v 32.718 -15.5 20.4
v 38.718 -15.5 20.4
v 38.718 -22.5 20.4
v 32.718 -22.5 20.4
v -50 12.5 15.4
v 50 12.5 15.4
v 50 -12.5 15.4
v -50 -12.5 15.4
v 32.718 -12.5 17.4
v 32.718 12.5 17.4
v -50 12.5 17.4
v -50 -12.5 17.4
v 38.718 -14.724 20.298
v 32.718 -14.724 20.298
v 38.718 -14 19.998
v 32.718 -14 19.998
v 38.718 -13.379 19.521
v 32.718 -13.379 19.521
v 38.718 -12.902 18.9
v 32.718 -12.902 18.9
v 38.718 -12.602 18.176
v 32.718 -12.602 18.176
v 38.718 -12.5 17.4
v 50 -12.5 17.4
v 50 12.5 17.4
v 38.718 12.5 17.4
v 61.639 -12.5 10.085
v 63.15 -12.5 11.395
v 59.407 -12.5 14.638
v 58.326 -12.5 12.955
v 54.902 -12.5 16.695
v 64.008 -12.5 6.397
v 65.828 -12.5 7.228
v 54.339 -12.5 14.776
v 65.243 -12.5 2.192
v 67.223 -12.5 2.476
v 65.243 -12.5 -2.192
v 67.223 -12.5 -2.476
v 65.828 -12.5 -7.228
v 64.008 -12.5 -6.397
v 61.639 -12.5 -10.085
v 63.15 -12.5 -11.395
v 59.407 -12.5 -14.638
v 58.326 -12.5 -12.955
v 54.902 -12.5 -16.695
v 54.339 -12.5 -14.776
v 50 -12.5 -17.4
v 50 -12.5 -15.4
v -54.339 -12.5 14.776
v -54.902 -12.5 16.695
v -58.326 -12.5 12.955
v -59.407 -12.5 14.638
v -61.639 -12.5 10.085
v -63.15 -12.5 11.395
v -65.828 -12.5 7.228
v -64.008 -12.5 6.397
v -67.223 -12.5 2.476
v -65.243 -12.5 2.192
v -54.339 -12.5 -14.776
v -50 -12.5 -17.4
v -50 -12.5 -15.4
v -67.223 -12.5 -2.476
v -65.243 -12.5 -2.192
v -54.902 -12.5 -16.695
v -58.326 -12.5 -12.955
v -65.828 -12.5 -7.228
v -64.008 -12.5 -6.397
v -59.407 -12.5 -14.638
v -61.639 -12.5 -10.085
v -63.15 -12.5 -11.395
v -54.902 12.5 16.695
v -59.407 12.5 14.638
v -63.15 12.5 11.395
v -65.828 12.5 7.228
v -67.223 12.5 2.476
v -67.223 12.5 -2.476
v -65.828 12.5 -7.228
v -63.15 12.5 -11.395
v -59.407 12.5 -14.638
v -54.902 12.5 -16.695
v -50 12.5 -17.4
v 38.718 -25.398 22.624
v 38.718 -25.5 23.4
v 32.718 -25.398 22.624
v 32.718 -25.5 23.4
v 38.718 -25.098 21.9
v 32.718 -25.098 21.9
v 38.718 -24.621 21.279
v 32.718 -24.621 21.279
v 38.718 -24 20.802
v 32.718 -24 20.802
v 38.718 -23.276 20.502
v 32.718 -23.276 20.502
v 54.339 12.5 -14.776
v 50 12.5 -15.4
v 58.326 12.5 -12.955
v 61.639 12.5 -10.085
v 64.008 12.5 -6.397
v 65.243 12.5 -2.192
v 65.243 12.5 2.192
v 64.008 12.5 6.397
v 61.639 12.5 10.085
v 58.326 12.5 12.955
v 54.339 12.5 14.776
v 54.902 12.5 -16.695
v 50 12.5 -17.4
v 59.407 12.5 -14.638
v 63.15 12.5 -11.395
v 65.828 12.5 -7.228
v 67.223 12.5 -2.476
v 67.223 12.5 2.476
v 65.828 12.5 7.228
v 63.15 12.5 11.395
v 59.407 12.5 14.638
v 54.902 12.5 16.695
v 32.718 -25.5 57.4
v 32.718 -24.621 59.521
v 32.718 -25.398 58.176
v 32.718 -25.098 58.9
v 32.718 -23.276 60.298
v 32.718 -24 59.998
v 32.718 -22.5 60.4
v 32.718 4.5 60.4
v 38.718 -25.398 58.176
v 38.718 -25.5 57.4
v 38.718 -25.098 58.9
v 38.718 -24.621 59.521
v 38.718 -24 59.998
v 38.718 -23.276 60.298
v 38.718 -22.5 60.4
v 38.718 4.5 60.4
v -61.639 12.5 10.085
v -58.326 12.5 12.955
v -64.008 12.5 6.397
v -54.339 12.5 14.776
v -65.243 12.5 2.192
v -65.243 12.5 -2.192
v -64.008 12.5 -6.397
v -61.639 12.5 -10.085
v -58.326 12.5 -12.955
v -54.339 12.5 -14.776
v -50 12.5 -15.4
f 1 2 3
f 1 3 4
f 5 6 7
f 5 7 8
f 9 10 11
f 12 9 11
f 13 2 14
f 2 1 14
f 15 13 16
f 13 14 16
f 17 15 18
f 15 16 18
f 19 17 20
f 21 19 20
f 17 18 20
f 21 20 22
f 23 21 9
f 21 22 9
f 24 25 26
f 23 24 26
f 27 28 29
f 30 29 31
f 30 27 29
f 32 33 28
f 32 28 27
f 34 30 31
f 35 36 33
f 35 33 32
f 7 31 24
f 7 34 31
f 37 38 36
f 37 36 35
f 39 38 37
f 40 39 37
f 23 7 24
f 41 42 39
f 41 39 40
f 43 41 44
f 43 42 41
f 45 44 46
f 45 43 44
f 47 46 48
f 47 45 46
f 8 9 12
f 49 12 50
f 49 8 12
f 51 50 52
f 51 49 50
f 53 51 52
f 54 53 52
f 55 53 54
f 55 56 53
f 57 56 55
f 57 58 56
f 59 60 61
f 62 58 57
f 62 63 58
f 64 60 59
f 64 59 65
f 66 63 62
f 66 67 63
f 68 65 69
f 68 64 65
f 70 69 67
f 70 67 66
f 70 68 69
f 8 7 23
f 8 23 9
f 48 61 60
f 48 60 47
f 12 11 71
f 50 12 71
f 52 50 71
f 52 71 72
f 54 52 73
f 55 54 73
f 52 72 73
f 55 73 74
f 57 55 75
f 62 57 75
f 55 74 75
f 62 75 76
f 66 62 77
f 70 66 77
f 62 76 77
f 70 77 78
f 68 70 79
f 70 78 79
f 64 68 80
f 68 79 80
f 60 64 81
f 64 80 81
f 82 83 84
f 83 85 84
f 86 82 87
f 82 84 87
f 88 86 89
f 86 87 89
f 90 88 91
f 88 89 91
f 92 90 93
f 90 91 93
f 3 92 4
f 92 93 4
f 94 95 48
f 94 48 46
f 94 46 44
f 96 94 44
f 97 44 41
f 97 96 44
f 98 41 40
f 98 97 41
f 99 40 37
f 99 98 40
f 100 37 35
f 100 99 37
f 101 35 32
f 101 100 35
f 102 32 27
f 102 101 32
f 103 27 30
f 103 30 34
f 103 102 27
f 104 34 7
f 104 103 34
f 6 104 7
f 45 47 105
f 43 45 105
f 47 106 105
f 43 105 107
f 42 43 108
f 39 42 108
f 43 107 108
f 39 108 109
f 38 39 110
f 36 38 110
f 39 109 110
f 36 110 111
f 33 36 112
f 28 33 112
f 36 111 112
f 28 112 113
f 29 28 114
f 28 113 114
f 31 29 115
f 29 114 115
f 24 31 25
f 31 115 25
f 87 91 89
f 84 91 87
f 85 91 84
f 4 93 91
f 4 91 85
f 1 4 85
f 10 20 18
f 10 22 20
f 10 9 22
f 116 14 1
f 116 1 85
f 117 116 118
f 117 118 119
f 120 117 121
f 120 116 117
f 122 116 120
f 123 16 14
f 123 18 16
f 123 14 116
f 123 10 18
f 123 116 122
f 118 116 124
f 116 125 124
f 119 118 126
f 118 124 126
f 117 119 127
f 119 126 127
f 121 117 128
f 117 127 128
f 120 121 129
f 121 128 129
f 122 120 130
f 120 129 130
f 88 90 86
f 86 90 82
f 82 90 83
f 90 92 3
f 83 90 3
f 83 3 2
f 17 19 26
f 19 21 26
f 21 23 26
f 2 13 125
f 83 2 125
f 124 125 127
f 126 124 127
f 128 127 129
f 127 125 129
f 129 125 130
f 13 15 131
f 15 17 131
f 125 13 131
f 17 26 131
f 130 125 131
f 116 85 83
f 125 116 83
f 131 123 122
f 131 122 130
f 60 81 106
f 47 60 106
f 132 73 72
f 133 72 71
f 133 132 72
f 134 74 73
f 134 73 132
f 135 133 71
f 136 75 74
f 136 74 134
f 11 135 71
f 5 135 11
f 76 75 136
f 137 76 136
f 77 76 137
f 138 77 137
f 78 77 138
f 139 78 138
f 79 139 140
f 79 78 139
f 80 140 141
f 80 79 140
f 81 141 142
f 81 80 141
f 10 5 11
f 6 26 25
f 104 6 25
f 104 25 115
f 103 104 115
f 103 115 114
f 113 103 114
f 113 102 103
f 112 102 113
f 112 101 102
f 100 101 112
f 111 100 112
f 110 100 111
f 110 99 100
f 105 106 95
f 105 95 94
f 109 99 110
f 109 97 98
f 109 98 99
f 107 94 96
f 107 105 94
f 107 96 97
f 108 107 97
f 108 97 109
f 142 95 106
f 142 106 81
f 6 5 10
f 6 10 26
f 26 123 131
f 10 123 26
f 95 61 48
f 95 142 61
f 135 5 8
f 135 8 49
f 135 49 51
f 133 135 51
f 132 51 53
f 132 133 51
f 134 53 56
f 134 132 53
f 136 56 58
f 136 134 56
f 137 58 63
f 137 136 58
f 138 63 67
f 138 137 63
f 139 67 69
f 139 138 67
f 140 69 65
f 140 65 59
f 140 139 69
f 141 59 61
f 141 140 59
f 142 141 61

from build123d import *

# Parameters (mm, degrees)
EXTRUDE_1_DEPTH     = 12.5
SKETCH_4_W          = 6
SKETCH_4_H          = 43
EXTRUDE_3_DEPTH     = 38
SKETCH_5_W          = 6
SKETCH_5_H          = 13
CUT_EXTRUDE_2_DEPTH = 3
SKETCH_6_W          = 6
SKETCH_6_H          = 43
CUT_EXTRUDE_3_DEPTH = 8
EXTRUDE_5_DEPTH     = 6
FILLET_1_R          = 3
FILLET_2_R          = 3


with BuildPart() as part:
    # 草图1 → 凸台-拉伸1 (new, symmetric)
    with BuildSketch(Plane(origin=(0, 0, 0), x_dir=(1, 0, 0), z_dir=(0, 1, 0))):
        with BuildLine():
            Line((-50, 17.4), (50, 17.4))
            ThreePointArc((50, 17.4), (67.4, 0), (50, -17.4))
            Line((50, -17.4), (-50, -17.4))
            ThreePointArc((-50, -17.4), (-67.4, 0), (-50, 17.4))
        make_face()
        with BuildLine():
            Line((-50, 15.4), (50, 15.4))
            ThreePointArc((50, 15.4), (65.4, 0), (50, -15.4))
            Line((50, -15.4), (-50, -15.4))
            ThreePointArc((-50, -15.4), (-65.4, 0), (-50, 15.4))
        make_face(mode=Mode.SUBTRACT)
    extrude(amount=EXTRUDE_1_DEPTH, both=True)

    # 草图4 → 凸台-拉伸3 (add)
    with BuildSketch(Plane(origin=(0, 12.5, 0), x_dir=(1, 0, 0), z_dir=(0, 1, 0))):
        with Locations((35.717845516, -38.9)):
            Rectangle(SKETCH_4_W, SKETCH_4_H)
    extrude(amount=-EXTRUDE_3_DEPTH)

    # 草图5 → 切除-拉伸2 (cut)
    with BuildSketch(Plane(origin=(0, 0, 17.4), x_dir=(-1, 0, 0), z_dir=(0, 0, -1))):
        with Locations((-35.717845516, -19)):
            Rectangle(SKETCH_5_W, SKETCH_5_H)
    extrude(amount=-CUT_EXTRUDE_2_DEPTH, mode=Mode.SUBTRACT)

    # 草图6 → 切除-拉伸3 (cut)
    with BuildSketch(Plane(origin=(0, 12.5, 0), x_dir=(1, 0, 0), z_dir=(0, 1, 0))):
        with Locations((35.717845516, -38.9)):
            Rectangle(SKETCH_6_W, SKETCH_6_H)
    extrude(amount=-CUT_EXTRUDE_3_DEPTH, mode=Mode.SUBTRACT)

    # 草图8 → 凸台-拉伸5 (add)
    with BuildSketch(Plane.ZY.offset(-32.717845516)):
        Polygon((17.4, 12.5), (17.4, 4.5), (60.4, 4.5), align=None)
    extrude(amount=-EXTRUDE_5_DEPTH)

    # 圆角1
    fillet_1_edges = [part.edges().sort_by_distance(p)[0] for p in [
        (35.717845516, -25.5, 60.4),
        (35.717845516, -25.5, 20.4),
    ]]
    fillet(fillet_1_edges, radius=FILLET_1_R)

    # 圆角2
    fillet_2_edges = [part.edges().sort_by_distance(p)[0] for p in [
        (35.717845516, -12.5, 20.4),
    ]]
    fillet(fillet_2_edges, radius=FILLET_2_R)


solid = part.part
